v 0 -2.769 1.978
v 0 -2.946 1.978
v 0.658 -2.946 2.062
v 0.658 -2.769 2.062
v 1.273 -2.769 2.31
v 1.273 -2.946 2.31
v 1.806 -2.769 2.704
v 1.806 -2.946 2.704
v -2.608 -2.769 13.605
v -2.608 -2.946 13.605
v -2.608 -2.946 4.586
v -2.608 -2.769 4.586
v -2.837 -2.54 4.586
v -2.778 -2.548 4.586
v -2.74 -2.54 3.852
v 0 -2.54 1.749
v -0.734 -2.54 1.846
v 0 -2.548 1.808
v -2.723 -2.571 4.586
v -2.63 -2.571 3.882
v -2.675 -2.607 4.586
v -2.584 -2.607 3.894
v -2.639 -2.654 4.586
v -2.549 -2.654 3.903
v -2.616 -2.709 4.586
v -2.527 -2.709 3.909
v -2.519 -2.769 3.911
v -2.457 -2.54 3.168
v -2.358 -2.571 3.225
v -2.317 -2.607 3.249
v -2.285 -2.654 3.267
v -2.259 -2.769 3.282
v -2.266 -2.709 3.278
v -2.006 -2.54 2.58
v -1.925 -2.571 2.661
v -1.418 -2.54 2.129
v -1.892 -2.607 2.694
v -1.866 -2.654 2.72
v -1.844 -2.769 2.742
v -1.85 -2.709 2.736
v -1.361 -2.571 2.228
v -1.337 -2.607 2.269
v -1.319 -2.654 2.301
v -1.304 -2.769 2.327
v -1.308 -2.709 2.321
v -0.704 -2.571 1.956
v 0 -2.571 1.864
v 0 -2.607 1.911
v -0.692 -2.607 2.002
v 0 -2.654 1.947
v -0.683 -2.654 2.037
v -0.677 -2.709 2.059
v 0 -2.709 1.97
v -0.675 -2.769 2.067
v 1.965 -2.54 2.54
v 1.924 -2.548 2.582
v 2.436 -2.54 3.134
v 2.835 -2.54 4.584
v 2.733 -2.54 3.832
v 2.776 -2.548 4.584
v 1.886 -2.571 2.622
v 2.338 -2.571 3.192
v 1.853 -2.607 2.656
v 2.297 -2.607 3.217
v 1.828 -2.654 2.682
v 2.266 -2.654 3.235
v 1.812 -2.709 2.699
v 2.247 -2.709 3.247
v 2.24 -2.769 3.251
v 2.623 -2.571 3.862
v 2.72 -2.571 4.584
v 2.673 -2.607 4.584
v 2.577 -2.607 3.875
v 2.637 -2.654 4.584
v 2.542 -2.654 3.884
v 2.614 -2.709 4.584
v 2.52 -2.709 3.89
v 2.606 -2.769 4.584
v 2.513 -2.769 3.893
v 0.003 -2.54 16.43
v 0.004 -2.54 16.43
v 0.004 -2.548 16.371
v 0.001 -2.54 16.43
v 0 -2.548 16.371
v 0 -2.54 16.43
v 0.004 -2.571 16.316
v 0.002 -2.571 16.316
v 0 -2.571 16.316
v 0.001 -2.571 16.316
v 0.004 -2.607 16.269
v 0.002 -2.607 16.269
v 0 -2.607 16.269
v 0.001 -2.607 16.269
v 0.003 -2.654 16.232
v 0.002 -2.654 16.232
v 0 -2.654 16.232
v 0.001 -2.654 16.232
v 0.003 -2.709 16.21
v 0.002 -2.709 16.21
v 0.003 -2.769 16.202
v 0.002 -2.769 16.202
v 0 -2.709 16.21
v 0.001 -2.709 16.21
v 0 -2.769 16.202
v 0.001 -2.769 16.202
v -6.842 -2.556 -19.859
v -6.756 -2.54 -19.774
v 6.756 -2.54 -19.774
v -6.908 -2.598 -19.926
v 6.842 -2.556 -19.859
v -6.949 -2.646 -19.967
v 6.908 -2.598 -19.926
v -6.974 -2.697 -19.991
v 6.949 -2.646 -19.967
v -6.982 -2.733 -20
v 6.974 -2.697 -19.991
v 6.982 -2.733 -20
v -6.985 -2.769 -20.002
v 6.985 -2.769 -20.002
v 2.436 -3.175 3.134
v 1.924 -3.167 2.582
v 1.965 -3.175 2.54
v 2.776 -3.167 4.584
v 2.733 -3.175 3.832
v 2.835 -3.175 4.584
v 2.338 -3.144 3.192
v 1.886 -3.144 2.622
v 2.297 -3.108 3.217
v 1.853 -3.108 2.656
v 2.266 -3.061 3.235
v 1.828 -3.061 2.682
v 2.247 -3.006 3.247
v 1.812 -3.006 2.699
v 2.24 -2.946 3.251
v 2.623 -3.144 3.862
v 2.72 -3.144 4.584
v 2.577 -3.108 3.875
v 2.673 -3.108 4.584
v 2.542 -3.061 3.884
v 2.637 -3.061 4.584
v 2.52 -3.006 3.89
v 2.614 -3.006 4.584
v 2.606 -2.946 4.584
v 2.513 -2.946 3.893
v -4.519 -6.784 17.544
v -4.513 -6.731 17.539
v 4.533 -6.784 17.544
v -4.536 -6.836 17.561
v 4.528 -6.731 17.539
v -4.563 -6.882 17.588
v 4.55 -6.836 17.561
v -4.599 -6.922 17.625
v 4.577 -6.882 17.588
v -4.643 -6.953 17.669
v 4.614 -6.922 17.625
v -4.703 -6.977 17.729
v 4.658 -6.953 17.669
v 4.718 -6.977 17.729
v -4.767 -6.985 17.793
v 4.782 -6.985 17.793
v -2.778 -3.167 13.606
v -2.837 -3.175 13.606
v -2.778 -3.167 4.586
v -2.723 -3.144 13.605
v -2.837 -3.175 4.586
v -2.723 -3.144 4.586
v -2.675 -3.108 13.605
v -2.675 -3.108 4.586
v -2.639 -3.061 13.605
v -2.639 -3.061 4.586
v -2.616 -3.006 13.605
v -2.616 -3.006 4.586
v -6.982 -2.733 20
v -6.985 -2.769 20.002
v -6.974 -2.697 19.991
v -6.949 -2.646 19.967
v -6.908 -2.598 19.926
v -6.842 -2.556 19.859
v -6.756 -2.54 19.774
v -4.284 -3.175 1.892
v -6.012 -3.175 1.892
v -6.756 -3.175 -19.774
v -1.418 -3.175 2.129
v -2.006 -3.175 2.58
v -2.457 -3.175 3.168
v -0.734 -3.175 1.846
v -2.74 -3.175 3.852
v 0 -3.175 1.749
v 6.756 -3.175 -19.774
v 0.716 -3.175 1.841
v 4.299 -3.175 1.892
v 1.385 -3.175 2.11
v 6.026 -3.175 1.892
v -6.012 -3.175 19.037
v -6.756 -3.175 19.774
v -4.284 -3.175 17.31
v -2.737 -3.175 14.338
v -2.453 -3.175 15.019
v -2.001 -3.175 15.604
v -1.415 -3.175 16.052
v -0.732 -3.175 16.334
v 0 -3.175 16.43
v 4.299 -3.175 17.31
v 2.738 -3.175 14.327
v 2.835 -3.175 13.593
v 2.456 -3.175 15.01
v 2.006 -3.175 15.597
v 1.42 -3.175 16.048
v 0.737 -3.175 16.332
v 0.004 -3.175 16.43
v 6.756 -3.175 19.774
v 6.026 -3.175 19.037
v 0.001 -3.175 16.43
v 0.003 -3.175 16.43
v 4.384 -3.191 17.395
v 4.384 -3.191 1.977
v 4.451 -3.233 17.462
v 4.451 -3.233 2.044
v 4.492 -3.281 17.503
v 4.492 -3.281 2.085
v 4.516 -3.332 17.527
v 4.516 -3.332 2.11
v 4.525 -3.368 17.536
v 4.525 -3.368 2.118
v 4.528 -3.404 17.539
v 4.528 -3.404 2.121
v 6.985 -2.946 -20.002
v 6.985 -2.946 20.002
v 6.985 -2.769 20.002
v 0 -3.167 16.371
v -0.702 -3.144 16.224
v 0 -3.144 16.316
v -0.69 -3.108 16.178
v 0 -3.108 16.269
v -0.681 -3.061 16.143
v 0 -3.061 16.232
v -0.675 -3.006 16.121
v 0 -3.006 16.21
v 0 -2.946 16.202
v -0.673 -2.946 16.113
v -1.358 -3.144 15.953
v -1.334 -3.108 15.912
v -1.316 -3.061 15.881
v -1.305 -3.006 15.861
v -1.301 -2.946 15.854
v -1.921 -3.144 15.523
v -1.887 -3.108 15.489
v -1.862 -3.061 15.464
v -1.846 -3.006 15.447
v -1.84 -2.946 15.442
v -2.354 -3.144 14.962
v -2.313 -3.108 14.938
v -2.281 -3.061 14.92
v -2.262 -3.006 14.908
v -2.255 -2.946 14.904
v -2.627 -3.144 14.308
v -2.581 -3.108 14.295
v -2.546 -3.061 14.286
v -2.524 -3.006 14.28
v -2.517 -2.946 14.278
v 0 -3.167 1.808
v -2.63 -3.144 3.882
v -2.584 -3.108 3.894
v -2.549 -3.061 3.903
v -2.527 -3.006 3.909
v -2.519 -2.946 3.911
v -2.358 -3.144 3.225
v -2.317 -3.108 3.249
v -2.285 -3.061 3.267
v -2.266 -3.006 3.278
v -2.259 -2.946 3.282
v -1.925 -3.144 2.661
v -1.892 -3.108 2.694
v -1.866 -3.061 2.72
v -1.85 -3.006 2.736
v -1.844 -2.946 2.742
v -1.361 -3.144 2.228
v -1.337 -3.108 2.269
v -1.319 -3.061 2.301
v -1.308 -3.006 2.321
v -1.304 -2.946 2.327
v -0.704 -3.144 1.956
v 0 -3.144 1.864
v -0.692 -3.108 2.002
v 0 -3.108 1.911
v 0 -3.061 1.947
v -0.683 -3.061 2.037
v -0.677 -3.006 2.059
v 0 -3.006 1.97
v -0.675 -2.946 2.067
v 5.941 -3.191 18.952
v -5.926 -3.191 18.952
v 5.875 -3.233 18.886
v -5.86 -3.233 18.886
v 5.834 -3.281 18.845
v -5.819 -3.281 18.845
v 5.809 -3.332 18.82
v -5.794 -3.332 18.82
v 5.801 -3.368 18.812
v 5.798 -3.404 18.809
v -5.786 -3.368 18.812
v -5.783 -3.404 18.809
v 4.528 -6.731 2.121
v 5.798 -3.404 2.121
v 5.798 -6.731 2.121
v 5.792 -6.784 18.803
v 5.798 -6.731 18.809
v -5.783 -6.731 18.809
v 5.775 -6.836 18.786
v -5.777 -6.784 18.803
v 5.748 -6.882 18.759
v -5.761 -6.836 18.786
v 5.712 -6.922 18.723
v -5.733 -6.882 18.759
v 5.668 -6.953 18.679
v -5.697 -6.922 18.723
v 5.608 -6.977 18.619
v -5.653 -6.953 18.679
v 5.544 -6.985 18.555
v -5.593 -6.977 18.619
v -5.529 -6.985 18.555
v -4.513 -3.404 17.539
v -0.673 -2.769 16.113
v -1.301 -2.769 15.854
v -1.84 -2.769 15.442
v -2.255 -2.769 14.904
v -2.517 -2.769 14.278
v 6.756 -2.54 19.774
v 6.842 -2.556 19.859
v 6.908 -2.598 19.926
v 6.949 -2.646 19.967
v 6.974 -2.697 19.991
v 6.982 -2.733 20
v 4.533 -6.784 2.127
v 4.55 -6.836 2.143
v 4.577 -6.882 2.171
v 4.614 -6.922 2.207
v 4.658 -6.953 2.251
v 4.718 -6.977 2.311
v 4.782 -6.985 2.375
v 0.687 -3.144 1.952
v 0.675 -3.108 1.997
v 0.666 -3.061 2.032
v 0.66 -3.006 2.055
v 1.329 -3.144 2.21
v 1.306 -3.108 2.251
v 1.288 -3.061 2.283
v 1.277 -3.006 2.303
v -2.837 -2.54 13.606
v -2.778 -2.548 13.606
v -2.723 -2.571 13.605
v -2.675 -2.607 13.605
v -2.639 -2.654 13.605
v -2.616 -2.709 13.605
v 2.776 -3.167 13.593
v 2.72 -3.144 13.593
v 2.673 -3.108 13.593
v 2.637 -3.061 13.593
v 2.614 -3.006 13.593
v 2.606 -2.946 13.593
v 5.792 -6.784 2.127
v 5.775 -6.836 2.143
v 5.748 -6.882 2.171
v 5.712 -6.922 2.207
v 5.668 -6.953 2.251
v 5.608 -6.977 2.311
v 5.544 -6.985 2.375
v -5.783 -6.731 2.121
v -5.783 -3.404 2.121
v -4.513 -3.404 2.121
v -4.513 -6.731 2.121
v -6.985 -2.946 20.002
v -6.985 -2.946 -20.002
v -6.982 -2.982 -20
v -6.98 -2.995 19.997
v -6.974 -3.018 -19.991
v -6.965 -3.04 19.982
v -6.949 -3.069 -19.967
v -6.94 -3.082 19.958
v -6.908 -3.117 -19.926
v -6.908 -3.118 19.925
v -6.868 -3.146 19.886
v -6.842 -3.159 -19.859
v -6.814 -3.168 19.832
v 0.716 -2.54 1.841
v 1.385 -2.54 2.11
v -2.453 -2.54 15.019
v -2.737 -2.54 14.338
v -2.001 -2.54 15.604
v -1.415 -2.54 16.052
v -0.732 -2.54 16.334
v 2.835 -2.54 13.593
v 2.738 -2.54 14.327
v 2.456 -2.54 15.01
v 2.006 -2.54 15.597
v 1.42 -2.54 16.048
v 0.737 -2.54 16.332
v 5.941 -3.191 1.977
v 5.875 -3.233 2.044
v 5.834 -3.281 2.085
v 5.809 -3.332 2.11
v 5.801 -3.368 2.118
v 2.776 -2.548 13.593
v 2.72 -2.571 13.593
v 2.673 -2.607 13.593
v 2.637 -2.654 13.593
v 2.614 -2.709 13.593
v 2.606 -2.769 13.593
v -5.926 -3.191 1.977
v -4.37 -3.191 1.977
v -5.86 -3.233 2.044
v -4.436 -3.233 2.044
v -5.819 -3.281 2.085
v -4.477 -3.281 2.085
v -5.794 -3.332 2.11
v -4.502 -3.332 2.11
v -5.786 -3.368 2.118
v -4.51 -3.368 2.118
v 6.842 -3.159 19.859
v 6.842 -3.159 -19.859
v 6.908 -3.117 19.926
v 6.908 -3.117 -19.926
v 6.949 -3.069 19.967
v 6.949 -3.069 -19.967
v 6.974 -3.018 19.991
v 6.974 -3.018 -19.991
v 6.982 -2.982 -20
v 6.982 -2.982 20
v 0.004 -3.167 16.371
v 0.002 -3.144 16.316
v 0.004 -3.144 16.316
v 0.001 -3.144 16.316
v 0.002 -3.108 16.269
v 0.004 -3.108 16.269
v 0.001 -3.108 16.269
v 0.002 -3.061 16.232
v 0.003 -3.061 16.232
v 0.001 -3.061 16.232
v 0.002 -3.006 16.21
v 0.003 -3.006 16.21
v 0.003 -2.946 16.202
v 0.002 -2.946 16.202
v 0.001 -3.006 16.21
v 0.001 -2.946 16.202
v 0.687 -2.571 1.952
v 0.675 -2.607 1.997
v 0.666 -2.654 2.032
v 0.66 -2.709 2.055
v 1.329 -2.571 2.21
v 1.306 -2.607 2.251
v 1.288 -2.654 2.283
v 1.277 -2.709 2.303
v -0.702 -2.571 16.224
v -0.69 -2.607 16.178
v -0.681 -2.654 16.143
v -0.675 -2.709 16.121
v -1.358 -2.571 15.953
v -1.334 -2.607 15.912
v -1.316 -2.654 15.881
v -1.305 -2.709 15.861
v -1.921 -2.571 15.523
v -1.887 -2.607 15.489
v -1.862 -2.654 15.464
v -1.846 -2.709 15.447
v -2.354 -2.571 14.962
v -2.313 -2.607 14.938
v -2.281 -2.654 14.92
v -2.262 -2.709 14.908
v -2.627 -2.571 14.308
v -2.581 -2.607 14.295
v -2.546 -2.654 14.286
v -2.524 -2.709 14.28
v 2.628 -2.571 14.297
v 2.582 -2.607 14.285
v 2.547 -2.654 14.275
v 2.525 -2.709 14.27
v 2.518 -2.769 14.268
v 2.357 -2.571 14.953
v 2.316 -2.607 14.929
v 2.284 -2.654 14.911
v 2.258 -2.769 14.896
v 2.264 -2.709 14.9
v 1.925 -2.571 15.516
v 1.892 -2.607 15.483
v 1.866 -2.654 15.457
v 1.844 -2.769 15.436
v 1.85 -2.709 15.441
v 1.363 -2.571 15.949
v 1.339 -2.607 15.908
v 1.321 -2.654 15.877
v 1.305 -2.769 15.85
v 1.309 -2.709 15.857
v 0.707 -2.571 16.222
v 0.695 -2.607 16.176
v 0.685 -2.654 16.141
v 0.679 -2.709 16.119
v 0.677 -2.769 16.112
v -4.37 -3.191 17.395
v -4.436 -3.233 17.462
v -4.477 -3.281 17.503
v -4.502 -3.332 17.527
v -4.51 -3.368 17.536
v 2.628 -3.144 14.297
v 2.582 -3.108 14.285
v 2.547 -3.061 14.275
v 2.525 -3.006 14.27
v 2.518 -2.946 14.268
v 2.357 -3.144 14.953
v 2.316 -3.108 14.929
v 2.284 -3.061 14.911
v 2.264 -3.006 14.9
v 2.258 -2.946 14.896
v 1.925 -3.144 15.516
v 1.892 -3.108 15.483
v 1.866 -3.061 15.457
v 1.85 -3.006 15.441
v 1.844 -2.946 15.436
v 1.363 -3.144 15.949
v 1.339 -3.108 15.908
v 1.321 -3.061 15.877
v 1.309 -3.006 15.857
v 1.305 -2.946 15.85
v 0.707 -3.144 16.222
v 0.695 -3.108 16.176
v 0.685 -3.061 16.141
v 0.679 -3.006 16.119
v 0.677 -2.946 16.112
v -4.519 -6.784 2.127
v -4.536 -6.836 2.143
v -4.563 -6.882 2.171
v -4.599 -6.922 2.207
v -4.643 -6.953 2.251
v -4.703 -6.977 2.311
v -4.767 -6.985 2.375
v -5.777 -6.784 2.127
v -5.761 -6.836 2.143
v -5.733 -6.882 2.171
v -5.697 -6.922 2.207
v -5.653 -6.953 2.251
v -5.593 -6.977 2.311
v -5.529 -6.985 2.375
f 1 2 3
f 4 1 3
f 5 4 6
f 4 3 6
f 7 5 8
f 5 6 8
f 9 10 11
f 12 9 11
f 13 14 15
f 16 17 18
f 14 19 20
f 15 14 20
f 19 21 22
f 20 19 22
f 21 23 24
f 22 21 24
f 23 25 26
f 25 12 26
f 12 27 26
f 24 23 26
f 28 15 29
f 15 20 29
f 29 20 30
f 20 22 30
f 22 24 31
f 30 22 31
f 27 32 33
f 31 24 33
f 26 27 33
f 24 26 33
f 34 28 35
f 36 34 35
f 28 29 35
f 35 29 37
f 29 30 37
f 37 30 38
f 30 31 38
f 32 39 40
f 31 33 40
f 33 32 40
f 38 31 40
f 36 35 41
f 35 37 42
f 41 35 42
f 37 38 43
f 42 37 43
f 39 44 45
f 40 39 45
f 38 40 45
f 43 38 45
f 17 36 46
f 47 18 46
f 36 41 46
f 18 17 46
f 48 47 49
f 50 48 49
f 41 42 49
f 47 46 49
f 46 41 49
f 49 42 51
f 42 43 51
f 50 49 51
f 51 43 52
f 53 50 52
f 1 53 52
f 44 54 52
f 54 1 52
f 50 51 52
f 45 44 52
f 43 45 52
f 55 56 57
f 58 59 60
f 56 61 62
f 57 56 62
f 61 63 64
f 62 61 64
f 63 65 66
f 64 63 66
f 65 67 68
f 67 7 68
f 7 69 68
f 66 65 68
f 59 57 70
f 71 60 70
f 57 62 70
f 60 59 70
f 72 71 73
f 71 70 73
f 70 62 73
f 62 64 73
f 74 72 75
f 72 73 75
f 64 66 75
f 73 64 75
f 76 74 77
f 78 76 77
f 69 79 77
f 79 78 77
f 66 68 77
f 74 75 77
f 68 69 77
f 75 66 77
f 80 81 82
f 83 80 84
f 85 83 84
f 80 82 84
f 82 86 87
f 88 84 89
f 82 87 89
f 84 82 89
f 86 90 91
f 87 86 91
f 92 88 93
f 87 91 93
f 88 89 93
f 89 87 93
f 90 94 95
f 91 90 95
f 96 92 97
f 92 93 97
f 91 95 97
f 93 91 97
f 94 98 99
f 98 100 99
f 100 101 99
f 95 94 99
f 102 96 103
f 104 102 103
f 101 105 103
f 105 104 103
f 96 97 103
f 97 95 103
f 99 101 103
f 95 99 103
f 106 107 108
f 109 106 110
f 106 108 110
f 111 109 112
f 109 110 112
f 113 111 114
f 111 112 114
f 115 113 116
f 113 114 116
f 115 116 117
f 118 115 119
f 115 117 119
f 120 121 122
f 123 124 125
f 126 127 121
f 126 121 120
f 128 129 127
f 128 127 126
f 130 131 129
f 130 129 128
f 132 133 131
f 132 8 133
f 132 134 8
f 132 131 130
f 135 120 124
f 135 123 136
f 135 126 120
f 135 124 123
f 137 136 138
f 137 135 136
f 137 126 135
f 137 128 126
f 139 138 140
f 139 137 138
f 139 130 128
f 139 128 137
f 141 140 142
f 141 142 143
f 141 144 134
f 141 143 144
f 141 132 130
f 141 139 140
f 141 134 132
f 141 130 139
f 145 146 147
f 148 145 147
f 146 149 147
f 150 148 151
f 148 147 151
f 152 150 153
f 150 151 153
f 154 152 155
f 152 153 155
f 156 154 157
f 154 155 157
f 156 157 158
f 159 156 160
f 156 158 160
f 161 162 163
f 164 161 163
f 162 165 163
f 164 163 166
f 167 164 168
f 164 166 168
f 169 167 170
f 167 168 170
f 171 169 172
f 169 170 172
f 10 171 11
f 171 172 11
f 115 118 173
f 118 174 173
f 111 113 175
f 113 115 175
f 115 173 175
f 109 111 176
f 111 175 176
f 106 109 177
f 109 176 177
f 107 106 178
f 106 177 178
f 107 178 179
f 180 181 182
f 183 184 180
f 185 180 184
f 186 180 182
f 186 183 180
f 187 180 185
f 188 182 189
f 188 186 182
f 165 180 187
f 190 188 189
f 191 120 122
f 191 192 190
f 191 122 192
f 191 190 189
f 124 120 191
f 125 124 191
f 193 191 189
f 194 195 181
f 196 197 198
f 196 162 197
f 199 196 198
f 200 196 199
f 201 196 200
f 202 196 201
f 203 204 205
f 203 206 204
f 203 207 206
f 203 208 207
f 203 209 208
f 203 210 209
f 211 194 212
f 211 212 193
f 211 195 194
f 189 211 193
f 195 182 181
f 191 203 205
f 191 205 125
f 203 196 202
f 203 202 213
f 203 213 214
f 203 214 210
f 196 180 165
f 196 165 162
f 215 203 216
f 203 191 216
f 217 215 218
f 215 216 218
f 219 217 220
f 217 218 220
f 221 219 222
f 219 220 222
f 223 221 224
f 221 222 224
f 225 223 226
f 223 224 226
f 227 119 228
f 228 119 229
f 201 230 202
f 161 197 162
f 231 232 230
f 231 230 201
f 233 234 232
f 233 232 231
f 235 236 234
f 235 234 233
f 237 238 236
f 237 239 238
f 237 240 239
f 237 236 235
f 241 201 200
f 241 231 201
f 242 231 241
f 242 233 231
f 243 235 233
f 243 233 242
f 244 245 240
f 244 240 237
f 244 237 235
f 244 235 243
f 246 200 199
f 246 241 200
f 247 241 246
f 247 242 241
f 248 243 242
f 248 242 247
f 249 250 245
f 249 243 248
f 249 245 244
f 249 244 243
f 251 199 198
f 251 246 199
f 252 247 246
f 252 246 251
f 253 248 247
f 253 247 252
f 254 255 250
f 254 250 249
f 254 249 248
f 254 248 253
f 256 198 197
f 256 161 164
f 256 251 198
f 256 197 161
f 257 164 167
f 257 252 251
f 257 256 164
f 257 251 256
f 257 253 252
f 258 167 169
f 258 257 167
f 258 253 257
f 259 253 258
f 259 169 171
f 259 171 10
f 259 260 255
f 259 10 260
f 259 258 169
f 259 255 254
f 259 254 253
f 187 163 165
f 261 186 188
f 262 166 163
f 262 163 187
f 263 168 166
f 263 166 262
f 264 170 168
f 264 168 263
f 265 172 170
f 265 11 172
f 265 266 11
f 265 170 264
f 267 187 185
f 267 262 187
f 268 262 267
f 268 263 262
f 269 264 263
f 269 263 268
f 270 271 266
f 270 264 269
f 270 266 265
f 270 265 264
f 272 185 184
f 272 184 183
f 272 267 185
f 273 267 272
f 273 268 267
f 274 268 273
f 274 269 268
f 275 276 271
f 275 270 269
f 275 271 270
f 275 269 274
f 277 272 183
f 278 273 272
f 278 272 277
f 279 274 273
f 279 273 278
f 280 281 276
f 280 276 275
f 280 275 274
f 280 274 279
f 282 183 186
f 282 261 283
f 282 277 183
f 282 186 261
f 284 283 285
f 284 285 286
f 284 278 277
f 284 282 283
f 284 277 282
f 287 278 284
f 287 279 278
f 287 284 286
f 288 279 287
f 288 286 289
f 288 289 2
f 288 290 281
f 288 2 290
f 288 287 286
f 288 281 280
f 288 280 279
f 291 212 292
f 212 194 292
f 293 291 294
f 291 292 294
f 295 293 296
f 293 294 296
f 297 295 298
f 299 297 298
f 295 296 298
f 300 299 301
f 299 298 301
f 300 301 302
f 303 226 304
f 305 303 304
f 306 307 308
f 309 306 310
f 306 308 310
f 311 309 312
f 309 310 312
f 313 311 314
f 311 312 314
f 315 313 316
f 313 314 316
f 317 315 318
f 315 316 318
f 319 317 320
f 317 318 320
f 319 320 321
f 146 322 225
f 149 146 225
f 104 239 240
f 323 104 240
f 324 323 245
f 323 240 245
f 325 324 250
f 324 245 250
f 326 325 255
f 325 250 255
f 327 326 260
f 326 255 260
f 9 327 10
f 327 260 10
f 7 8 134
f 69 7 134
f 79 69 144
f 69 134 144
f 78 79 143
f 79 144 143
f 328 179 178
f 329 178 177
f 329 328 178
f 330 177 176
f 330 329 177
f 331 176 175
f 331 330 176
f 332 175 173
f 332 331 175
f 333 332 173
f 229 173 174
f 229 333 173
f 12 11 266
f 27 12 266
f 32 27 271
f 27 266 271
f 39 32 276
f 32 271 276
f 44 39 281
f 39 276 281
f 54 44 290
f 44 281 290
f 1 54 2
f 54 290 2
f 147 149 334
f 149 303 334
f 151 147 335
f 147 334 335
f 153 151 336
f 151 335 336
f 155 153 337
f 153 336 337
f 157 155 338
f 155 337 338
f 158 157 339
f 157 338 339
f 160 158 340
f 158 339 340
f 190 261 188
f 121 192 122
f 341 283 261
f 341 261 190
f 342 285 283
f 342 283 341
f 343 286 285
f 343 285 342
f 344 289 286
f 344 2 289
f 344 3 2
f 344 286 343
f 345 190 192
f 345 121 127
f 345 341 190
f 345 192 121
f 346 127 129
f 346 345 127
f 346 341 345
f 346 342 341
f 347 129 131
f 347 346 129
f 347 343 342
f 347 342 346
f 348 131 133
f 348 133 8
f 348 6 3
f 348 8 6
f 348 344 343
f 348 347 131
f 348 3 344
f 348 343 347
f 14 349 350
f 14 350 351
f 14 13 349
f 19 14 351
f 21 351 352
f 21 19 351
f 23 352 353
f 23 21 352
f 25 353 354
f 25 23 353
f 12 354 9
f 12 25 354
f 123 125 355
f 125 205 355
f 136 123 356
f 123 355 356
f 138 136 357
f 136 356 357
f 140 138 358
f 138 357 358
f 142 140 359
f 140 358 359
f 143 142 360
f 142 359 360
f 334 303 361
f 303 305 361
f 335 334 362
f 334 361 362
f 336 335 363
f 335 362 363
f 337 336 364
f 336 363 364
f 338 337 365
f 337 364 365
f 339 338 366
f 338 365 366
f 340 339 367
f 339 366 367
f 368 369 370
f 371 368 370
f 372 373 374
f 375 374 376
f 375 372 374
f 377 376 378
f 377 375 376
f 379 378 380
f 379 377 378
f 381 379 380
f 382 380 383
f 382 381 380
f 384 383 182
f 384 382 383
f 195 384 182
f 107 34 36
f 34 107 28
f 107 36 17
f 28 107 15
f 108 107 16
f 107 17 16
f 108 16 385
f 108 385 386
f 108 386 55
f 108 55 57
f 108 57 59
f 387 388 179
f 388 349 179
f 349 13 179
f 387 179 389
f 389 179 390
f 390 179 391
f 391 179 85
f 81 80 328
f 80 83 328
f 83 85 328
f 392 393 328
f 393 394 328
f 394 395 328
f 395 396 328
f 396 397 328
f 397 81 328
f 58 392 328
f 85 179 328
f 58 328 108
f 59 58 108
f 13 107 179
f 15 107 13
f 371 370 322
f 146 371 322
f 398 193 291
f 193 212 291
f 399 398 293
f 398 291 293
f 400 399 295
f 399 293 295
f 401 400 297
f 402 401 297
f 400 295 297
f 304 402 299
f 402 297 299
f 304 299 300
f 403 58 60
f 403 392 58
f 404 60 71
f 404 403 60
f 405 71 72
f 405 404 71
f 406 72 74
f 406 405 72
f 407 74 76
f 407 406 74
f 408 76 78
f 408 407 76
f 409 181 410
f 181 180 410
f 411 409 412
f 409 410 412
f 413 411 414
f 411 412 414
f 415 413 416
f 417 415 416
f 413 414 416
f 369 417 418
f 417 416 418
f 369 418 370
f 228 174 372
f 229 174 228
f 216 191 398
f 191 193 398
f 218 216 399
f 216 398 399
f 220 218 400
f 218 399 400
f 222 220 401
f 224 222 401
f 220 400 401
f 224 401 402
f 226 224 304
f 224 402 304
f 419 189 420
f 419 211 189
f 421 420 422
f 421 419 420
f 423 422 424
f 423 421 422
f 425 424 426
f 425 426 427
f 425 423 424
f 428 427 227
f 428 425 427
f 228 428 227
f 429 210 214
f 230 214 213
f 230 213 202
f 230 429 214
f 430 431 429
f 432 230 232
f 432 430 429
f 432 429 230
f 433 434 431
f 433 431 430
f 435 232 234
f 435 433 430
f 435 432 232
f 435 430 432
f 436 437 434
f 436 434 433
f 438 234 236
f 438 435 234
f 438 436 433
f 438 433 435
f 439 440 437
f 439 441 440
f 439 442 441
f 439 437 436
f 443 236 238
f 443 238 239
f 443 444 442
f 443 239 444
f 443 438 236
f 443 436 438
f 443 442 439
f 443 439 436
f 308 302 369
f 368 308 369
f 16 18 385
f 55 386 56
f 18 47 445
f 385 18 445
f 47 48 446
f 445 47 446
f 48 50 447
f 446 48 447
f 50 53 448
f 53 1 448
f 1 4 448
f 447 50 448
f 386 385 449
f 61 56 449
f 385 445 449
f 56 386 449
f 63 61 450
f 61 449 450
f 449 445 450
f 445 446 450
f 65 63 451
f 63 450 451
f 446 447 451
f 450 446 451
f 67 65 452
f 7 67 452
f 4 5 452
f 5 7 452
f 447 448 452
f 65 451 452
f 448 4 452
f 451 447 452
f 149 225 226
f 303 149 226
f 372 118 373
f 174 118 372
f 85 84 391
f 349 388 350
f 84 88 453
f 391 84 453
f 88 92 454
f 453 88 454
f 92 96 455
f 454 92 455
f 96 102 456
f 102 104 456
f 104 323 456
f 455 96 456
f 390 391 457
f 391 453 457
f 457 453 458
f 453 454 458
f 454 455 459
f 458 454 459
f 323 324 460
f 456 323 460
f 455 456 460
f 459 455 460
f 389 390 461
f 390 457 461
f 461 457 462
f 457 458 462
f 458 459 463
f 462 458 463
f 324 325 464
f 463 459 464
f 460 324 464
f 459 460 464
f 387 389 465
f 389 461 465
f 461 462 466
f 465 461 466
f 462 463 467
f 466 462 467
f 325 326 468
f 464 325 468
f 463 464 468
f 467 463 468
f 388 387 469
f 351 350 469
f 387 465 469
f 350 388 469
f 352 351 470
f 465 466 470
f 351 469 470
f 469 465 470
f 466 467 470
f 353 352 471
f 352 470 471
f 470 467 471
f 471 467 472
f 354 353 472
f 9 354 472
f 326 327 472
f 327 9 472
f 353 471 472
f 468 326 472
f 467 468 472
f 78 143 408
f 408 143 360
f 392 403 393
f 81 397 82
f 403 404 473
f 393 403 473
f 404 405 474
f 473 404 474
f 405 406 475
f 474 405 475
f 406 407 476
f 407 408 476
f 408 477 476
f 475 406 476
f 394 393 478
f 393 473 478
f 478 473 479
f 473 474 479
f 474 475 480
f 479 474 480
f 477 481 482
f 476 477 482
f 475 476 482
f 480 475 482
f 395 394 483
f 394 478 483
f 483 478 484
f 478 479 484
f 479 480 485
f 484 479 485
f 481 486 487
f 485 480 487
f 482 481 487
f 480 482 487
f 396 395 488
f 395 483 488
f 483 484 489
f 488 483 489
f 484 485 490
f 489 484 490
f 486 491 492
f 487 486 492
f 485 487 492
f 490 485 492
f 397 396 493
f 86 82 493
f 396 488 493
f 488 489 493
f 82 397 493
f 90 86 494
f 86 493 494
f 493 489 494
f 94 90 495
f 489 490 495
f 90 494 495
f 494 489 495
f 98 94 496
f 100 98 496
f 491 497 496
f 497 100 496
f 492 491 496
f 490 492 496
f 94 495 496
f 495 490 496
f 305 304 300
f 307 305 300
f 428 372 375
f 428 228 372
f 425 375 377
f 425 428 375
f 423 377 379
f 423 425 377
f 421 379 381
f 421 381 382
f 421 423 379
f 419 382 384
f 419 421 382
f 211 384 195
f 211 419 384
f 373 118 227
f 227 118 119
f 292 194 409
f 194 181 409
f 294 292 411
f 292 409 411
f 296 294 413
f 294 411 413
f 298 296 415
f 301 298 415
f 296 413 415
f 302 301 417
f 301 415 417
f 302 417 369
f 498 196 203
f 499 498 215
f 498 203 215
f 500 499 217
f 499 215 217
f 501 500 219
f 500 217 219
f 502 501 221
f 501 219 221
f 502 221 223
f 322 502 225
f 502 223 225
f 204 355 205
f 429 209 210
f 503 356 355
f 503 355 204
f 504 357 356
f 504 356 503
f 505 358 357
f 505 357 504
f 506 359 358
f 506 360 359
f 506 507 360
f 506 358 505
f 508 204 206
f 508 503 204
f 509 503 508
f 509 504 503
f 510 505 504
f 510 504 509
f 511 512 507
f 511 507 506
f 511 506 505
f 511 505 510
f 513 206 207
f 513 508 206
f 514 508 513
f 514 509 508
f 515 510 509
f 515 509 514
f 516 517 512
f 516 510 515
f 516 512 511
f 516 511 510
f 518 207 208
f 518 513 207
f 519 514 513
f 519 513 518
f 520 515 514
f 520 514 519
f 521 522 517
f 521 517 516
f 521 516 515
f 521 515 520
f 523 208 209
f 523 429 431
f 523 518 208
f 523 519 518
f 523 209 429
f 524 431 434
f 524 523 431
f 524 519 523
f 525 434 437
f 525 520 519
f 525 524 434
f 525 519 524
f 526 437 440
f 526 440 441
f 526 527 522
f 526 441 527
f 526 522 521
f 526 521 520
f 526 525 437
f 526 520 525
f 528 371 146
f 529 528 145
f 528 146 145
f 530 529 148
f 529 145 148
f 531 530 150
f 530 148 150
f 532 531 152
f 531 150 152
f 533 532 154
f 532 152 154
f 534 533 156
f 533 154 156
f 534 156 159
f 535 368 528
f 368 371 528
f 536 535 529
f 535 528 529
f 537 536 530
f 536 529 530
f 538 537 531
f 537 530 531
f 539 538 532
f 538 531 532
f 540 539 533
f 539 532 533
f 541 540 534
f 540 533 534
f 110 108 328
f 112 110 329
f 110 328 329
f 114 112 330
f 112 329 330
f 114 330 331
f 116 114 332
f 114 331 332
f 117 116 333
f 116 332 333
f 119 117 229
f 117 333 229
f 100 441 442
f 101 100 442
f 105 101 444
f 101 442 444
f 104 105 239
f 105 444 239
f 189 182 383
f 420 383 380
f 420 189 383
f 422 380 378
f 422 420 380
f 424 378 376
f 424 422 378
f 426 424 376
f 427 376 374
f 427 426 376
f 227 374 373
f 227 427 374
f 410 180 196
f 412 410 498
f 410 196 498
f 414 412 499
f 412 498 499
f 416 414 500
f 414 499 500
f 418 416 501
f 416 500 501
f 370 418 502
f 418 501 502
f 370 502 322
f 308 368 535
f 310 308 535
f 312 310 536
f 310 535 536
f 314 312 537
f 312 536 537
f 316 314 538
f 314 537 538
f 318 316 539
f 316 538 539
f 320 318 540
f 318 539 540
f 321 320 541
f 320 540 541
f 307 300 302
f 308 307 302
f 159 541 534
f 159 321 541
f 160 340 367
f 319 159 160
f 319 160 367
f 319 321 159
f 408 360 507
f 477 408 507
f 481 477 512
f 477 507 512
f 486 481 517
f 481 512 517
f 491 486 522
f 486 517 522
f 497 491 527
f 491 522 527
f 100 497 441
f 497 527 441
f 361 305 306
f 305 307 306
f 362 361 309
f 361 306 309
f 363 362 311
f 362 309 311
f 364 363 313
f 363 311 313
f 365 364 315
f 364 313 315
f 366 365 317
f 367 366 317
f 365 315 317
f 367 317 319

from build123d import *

# Parameters (mm, degrees)
F0_W     = 13.97
F0_H     = 40.005
F1_DEPTH = 3.175
F2_DEPTH = 2.54
F5_DEPTH = 25.4
F6_DEPTH = 3.81
F7_R     = 0.2286
F8_R     = 0.2286
F9_R     = 0.254


with BuildPart() as f1:
    # F0 (on Front) → F1 (new body)
    with BuildSketch(Plane.XZ):
        Rectangle(F0_W, F0_H)
    extrude(amount=F1_DEPTH)

    # F2 (cut): a face of the model
    f2_faces = [f1.faces().sort_by_distance(p)[0] for p in [
        (0, 0, 0),
    ]]
    extrude(f2_faces, amount=-F2_DEPTH, mode=Mode.SUBTRACT)

    # F3 (on face) → F5 (cut)
    with BuildSketch(Plane.XZ.offset(3.175)):
        with BuildLine():
            Line((2.6061468011, 4.583747707), (2.6061468011, 13.593294405))
            ThreePointArc((2.6061468011, 13.593294405), (1.8441656406, 15.4357593505), (0.003389831, 16.201812079))
            ThreePointArc((0.003389831, 16.201812079), (0.001844595, 16.2018134827), (0.0002993585, 16.2018139709))
            Line((0.0002993585, 16.2018139709), (0.0002993585, 1.9778139709))
            ThreePointArc((0.0002993585, 1.9778139709), (0.9737013076, 2.1662350173), (1.8064818654, 2.704278127))
            ThreePointArc((1.8064818654, 2.704278127), (2.3979195865, 3.5624899149), (2.6061468011, 4.583747707))
        make_face()
        with BuildLine():
            Line((0.0002993585, 1.9778139709), (0.0002993585, 16.2018139709))
            ThreePointArc((0.0002993585, 16.2018139709), (-1.8401435929, 15.4418995197), (-2.6082506073, 13.6048606402))
            Line((-2.6082506073, 13.6048606402), (-2.6082570215, 4.5863722062))
            ThreePointArc((-2.6082570215, 4.5863722062), (-1.8442292029, 2.7418431015), (0.0002993585, 1.9778139709))
        make_face()
    extrude(amount=-F5_DEPTH, mode=Mode.SUBTRACT)

    # F4 (on face) → F6 (join)
    with BuildSketch(Plane.XZ.offset(3.175)):
        Polygon((-5.783022847, 2.1209), (-4.513022847, 2.1209), (-4.513022847, 17.5387), (4.5277241152, 17.5387), (4.5277241152, 2.1209), (5.7977241152, 2.1209), (5.7977241152, 18.8087), (-5.783022847, 18.8087), align=None)
    extrude(amount=F6_DEPTH)

    # F7
    f7_edges = [f1.edges().sort_by_distance(p)[0] for p in [
        (6.985, -2.54, 0),
        (0, -2.54, -20.0025),
        (0, -2.54, 20.0025),
        (-6.985, -2.54, 0),
        (2.39792, -2.54, 3.56249),
        (2.606147, -2.54, 9.088521),
        (1.844166, -2.54, 15.435759),
        (0.001845, -2.54, 16.201813),
        (-1.840144, -2.54, 15.4419),
        (-2.608254, -2.54, 9.095616),
        (-1.022696, -2.54, 2.186777),
    ]]
    fillet(f7_edges, radius=F7_R)

    # F8
    f8_edges = [f1.edges().sort_by_distance(p)[0] for p in [
        (6.985, -3.175, 0),
        (0, -3.175, -20.0025),
        (0, -3.175, 20.0025),
        (-6.985, -3.175, 0),
        (2.39792, -3.175, 3.56249),
        (-1.022696, -3.175, 2.186777),
        (2.606147, -3.175, 9.088521),
        (-2.608254, -3.175, 9.095616),
        (1.844166, -3.175, 15.435759),
        (-1.840144, -3.175, 15.4419),
        (0.001845, -3.175, 16.201813),
        (-5.148023, -3.175, 2.1209),
        (-4.513023, -3.175, 9.8298),
        (0.007351, -3.175, 17.5387),
        (4.527724, -3.175, 9.8298),
        (5.162724, -3.175, 2.1209),
        (5.797724, -3.175, 10.4648),
        (0.007351, -3.175, 18.8087),
        (-5.783023, -3.175, 10.4648),
    ]]
    fillet(f8_edges, radius=F8_R)

    # F9
    f9_edges = [f1.edges().sort_by_distance(p)[0] for p in [
        (-5.148023, -6.985, 2.1209),
        (-4.513023, -6.985, 9.8298),
        (0.007351, -6.985, 17.5387),
        (4.527724, -6.985, 9.8298),
        (5.162724, -6.985, 2.1209),
        (5.797724, -6.985, 10.4648),
        (0.007351, -6.985, 18.8087),
        (-5.783023, -6.985, 10.4648),
    ]]
    fillet(f9_edges, radius=F9_R)


solid = f1.part
